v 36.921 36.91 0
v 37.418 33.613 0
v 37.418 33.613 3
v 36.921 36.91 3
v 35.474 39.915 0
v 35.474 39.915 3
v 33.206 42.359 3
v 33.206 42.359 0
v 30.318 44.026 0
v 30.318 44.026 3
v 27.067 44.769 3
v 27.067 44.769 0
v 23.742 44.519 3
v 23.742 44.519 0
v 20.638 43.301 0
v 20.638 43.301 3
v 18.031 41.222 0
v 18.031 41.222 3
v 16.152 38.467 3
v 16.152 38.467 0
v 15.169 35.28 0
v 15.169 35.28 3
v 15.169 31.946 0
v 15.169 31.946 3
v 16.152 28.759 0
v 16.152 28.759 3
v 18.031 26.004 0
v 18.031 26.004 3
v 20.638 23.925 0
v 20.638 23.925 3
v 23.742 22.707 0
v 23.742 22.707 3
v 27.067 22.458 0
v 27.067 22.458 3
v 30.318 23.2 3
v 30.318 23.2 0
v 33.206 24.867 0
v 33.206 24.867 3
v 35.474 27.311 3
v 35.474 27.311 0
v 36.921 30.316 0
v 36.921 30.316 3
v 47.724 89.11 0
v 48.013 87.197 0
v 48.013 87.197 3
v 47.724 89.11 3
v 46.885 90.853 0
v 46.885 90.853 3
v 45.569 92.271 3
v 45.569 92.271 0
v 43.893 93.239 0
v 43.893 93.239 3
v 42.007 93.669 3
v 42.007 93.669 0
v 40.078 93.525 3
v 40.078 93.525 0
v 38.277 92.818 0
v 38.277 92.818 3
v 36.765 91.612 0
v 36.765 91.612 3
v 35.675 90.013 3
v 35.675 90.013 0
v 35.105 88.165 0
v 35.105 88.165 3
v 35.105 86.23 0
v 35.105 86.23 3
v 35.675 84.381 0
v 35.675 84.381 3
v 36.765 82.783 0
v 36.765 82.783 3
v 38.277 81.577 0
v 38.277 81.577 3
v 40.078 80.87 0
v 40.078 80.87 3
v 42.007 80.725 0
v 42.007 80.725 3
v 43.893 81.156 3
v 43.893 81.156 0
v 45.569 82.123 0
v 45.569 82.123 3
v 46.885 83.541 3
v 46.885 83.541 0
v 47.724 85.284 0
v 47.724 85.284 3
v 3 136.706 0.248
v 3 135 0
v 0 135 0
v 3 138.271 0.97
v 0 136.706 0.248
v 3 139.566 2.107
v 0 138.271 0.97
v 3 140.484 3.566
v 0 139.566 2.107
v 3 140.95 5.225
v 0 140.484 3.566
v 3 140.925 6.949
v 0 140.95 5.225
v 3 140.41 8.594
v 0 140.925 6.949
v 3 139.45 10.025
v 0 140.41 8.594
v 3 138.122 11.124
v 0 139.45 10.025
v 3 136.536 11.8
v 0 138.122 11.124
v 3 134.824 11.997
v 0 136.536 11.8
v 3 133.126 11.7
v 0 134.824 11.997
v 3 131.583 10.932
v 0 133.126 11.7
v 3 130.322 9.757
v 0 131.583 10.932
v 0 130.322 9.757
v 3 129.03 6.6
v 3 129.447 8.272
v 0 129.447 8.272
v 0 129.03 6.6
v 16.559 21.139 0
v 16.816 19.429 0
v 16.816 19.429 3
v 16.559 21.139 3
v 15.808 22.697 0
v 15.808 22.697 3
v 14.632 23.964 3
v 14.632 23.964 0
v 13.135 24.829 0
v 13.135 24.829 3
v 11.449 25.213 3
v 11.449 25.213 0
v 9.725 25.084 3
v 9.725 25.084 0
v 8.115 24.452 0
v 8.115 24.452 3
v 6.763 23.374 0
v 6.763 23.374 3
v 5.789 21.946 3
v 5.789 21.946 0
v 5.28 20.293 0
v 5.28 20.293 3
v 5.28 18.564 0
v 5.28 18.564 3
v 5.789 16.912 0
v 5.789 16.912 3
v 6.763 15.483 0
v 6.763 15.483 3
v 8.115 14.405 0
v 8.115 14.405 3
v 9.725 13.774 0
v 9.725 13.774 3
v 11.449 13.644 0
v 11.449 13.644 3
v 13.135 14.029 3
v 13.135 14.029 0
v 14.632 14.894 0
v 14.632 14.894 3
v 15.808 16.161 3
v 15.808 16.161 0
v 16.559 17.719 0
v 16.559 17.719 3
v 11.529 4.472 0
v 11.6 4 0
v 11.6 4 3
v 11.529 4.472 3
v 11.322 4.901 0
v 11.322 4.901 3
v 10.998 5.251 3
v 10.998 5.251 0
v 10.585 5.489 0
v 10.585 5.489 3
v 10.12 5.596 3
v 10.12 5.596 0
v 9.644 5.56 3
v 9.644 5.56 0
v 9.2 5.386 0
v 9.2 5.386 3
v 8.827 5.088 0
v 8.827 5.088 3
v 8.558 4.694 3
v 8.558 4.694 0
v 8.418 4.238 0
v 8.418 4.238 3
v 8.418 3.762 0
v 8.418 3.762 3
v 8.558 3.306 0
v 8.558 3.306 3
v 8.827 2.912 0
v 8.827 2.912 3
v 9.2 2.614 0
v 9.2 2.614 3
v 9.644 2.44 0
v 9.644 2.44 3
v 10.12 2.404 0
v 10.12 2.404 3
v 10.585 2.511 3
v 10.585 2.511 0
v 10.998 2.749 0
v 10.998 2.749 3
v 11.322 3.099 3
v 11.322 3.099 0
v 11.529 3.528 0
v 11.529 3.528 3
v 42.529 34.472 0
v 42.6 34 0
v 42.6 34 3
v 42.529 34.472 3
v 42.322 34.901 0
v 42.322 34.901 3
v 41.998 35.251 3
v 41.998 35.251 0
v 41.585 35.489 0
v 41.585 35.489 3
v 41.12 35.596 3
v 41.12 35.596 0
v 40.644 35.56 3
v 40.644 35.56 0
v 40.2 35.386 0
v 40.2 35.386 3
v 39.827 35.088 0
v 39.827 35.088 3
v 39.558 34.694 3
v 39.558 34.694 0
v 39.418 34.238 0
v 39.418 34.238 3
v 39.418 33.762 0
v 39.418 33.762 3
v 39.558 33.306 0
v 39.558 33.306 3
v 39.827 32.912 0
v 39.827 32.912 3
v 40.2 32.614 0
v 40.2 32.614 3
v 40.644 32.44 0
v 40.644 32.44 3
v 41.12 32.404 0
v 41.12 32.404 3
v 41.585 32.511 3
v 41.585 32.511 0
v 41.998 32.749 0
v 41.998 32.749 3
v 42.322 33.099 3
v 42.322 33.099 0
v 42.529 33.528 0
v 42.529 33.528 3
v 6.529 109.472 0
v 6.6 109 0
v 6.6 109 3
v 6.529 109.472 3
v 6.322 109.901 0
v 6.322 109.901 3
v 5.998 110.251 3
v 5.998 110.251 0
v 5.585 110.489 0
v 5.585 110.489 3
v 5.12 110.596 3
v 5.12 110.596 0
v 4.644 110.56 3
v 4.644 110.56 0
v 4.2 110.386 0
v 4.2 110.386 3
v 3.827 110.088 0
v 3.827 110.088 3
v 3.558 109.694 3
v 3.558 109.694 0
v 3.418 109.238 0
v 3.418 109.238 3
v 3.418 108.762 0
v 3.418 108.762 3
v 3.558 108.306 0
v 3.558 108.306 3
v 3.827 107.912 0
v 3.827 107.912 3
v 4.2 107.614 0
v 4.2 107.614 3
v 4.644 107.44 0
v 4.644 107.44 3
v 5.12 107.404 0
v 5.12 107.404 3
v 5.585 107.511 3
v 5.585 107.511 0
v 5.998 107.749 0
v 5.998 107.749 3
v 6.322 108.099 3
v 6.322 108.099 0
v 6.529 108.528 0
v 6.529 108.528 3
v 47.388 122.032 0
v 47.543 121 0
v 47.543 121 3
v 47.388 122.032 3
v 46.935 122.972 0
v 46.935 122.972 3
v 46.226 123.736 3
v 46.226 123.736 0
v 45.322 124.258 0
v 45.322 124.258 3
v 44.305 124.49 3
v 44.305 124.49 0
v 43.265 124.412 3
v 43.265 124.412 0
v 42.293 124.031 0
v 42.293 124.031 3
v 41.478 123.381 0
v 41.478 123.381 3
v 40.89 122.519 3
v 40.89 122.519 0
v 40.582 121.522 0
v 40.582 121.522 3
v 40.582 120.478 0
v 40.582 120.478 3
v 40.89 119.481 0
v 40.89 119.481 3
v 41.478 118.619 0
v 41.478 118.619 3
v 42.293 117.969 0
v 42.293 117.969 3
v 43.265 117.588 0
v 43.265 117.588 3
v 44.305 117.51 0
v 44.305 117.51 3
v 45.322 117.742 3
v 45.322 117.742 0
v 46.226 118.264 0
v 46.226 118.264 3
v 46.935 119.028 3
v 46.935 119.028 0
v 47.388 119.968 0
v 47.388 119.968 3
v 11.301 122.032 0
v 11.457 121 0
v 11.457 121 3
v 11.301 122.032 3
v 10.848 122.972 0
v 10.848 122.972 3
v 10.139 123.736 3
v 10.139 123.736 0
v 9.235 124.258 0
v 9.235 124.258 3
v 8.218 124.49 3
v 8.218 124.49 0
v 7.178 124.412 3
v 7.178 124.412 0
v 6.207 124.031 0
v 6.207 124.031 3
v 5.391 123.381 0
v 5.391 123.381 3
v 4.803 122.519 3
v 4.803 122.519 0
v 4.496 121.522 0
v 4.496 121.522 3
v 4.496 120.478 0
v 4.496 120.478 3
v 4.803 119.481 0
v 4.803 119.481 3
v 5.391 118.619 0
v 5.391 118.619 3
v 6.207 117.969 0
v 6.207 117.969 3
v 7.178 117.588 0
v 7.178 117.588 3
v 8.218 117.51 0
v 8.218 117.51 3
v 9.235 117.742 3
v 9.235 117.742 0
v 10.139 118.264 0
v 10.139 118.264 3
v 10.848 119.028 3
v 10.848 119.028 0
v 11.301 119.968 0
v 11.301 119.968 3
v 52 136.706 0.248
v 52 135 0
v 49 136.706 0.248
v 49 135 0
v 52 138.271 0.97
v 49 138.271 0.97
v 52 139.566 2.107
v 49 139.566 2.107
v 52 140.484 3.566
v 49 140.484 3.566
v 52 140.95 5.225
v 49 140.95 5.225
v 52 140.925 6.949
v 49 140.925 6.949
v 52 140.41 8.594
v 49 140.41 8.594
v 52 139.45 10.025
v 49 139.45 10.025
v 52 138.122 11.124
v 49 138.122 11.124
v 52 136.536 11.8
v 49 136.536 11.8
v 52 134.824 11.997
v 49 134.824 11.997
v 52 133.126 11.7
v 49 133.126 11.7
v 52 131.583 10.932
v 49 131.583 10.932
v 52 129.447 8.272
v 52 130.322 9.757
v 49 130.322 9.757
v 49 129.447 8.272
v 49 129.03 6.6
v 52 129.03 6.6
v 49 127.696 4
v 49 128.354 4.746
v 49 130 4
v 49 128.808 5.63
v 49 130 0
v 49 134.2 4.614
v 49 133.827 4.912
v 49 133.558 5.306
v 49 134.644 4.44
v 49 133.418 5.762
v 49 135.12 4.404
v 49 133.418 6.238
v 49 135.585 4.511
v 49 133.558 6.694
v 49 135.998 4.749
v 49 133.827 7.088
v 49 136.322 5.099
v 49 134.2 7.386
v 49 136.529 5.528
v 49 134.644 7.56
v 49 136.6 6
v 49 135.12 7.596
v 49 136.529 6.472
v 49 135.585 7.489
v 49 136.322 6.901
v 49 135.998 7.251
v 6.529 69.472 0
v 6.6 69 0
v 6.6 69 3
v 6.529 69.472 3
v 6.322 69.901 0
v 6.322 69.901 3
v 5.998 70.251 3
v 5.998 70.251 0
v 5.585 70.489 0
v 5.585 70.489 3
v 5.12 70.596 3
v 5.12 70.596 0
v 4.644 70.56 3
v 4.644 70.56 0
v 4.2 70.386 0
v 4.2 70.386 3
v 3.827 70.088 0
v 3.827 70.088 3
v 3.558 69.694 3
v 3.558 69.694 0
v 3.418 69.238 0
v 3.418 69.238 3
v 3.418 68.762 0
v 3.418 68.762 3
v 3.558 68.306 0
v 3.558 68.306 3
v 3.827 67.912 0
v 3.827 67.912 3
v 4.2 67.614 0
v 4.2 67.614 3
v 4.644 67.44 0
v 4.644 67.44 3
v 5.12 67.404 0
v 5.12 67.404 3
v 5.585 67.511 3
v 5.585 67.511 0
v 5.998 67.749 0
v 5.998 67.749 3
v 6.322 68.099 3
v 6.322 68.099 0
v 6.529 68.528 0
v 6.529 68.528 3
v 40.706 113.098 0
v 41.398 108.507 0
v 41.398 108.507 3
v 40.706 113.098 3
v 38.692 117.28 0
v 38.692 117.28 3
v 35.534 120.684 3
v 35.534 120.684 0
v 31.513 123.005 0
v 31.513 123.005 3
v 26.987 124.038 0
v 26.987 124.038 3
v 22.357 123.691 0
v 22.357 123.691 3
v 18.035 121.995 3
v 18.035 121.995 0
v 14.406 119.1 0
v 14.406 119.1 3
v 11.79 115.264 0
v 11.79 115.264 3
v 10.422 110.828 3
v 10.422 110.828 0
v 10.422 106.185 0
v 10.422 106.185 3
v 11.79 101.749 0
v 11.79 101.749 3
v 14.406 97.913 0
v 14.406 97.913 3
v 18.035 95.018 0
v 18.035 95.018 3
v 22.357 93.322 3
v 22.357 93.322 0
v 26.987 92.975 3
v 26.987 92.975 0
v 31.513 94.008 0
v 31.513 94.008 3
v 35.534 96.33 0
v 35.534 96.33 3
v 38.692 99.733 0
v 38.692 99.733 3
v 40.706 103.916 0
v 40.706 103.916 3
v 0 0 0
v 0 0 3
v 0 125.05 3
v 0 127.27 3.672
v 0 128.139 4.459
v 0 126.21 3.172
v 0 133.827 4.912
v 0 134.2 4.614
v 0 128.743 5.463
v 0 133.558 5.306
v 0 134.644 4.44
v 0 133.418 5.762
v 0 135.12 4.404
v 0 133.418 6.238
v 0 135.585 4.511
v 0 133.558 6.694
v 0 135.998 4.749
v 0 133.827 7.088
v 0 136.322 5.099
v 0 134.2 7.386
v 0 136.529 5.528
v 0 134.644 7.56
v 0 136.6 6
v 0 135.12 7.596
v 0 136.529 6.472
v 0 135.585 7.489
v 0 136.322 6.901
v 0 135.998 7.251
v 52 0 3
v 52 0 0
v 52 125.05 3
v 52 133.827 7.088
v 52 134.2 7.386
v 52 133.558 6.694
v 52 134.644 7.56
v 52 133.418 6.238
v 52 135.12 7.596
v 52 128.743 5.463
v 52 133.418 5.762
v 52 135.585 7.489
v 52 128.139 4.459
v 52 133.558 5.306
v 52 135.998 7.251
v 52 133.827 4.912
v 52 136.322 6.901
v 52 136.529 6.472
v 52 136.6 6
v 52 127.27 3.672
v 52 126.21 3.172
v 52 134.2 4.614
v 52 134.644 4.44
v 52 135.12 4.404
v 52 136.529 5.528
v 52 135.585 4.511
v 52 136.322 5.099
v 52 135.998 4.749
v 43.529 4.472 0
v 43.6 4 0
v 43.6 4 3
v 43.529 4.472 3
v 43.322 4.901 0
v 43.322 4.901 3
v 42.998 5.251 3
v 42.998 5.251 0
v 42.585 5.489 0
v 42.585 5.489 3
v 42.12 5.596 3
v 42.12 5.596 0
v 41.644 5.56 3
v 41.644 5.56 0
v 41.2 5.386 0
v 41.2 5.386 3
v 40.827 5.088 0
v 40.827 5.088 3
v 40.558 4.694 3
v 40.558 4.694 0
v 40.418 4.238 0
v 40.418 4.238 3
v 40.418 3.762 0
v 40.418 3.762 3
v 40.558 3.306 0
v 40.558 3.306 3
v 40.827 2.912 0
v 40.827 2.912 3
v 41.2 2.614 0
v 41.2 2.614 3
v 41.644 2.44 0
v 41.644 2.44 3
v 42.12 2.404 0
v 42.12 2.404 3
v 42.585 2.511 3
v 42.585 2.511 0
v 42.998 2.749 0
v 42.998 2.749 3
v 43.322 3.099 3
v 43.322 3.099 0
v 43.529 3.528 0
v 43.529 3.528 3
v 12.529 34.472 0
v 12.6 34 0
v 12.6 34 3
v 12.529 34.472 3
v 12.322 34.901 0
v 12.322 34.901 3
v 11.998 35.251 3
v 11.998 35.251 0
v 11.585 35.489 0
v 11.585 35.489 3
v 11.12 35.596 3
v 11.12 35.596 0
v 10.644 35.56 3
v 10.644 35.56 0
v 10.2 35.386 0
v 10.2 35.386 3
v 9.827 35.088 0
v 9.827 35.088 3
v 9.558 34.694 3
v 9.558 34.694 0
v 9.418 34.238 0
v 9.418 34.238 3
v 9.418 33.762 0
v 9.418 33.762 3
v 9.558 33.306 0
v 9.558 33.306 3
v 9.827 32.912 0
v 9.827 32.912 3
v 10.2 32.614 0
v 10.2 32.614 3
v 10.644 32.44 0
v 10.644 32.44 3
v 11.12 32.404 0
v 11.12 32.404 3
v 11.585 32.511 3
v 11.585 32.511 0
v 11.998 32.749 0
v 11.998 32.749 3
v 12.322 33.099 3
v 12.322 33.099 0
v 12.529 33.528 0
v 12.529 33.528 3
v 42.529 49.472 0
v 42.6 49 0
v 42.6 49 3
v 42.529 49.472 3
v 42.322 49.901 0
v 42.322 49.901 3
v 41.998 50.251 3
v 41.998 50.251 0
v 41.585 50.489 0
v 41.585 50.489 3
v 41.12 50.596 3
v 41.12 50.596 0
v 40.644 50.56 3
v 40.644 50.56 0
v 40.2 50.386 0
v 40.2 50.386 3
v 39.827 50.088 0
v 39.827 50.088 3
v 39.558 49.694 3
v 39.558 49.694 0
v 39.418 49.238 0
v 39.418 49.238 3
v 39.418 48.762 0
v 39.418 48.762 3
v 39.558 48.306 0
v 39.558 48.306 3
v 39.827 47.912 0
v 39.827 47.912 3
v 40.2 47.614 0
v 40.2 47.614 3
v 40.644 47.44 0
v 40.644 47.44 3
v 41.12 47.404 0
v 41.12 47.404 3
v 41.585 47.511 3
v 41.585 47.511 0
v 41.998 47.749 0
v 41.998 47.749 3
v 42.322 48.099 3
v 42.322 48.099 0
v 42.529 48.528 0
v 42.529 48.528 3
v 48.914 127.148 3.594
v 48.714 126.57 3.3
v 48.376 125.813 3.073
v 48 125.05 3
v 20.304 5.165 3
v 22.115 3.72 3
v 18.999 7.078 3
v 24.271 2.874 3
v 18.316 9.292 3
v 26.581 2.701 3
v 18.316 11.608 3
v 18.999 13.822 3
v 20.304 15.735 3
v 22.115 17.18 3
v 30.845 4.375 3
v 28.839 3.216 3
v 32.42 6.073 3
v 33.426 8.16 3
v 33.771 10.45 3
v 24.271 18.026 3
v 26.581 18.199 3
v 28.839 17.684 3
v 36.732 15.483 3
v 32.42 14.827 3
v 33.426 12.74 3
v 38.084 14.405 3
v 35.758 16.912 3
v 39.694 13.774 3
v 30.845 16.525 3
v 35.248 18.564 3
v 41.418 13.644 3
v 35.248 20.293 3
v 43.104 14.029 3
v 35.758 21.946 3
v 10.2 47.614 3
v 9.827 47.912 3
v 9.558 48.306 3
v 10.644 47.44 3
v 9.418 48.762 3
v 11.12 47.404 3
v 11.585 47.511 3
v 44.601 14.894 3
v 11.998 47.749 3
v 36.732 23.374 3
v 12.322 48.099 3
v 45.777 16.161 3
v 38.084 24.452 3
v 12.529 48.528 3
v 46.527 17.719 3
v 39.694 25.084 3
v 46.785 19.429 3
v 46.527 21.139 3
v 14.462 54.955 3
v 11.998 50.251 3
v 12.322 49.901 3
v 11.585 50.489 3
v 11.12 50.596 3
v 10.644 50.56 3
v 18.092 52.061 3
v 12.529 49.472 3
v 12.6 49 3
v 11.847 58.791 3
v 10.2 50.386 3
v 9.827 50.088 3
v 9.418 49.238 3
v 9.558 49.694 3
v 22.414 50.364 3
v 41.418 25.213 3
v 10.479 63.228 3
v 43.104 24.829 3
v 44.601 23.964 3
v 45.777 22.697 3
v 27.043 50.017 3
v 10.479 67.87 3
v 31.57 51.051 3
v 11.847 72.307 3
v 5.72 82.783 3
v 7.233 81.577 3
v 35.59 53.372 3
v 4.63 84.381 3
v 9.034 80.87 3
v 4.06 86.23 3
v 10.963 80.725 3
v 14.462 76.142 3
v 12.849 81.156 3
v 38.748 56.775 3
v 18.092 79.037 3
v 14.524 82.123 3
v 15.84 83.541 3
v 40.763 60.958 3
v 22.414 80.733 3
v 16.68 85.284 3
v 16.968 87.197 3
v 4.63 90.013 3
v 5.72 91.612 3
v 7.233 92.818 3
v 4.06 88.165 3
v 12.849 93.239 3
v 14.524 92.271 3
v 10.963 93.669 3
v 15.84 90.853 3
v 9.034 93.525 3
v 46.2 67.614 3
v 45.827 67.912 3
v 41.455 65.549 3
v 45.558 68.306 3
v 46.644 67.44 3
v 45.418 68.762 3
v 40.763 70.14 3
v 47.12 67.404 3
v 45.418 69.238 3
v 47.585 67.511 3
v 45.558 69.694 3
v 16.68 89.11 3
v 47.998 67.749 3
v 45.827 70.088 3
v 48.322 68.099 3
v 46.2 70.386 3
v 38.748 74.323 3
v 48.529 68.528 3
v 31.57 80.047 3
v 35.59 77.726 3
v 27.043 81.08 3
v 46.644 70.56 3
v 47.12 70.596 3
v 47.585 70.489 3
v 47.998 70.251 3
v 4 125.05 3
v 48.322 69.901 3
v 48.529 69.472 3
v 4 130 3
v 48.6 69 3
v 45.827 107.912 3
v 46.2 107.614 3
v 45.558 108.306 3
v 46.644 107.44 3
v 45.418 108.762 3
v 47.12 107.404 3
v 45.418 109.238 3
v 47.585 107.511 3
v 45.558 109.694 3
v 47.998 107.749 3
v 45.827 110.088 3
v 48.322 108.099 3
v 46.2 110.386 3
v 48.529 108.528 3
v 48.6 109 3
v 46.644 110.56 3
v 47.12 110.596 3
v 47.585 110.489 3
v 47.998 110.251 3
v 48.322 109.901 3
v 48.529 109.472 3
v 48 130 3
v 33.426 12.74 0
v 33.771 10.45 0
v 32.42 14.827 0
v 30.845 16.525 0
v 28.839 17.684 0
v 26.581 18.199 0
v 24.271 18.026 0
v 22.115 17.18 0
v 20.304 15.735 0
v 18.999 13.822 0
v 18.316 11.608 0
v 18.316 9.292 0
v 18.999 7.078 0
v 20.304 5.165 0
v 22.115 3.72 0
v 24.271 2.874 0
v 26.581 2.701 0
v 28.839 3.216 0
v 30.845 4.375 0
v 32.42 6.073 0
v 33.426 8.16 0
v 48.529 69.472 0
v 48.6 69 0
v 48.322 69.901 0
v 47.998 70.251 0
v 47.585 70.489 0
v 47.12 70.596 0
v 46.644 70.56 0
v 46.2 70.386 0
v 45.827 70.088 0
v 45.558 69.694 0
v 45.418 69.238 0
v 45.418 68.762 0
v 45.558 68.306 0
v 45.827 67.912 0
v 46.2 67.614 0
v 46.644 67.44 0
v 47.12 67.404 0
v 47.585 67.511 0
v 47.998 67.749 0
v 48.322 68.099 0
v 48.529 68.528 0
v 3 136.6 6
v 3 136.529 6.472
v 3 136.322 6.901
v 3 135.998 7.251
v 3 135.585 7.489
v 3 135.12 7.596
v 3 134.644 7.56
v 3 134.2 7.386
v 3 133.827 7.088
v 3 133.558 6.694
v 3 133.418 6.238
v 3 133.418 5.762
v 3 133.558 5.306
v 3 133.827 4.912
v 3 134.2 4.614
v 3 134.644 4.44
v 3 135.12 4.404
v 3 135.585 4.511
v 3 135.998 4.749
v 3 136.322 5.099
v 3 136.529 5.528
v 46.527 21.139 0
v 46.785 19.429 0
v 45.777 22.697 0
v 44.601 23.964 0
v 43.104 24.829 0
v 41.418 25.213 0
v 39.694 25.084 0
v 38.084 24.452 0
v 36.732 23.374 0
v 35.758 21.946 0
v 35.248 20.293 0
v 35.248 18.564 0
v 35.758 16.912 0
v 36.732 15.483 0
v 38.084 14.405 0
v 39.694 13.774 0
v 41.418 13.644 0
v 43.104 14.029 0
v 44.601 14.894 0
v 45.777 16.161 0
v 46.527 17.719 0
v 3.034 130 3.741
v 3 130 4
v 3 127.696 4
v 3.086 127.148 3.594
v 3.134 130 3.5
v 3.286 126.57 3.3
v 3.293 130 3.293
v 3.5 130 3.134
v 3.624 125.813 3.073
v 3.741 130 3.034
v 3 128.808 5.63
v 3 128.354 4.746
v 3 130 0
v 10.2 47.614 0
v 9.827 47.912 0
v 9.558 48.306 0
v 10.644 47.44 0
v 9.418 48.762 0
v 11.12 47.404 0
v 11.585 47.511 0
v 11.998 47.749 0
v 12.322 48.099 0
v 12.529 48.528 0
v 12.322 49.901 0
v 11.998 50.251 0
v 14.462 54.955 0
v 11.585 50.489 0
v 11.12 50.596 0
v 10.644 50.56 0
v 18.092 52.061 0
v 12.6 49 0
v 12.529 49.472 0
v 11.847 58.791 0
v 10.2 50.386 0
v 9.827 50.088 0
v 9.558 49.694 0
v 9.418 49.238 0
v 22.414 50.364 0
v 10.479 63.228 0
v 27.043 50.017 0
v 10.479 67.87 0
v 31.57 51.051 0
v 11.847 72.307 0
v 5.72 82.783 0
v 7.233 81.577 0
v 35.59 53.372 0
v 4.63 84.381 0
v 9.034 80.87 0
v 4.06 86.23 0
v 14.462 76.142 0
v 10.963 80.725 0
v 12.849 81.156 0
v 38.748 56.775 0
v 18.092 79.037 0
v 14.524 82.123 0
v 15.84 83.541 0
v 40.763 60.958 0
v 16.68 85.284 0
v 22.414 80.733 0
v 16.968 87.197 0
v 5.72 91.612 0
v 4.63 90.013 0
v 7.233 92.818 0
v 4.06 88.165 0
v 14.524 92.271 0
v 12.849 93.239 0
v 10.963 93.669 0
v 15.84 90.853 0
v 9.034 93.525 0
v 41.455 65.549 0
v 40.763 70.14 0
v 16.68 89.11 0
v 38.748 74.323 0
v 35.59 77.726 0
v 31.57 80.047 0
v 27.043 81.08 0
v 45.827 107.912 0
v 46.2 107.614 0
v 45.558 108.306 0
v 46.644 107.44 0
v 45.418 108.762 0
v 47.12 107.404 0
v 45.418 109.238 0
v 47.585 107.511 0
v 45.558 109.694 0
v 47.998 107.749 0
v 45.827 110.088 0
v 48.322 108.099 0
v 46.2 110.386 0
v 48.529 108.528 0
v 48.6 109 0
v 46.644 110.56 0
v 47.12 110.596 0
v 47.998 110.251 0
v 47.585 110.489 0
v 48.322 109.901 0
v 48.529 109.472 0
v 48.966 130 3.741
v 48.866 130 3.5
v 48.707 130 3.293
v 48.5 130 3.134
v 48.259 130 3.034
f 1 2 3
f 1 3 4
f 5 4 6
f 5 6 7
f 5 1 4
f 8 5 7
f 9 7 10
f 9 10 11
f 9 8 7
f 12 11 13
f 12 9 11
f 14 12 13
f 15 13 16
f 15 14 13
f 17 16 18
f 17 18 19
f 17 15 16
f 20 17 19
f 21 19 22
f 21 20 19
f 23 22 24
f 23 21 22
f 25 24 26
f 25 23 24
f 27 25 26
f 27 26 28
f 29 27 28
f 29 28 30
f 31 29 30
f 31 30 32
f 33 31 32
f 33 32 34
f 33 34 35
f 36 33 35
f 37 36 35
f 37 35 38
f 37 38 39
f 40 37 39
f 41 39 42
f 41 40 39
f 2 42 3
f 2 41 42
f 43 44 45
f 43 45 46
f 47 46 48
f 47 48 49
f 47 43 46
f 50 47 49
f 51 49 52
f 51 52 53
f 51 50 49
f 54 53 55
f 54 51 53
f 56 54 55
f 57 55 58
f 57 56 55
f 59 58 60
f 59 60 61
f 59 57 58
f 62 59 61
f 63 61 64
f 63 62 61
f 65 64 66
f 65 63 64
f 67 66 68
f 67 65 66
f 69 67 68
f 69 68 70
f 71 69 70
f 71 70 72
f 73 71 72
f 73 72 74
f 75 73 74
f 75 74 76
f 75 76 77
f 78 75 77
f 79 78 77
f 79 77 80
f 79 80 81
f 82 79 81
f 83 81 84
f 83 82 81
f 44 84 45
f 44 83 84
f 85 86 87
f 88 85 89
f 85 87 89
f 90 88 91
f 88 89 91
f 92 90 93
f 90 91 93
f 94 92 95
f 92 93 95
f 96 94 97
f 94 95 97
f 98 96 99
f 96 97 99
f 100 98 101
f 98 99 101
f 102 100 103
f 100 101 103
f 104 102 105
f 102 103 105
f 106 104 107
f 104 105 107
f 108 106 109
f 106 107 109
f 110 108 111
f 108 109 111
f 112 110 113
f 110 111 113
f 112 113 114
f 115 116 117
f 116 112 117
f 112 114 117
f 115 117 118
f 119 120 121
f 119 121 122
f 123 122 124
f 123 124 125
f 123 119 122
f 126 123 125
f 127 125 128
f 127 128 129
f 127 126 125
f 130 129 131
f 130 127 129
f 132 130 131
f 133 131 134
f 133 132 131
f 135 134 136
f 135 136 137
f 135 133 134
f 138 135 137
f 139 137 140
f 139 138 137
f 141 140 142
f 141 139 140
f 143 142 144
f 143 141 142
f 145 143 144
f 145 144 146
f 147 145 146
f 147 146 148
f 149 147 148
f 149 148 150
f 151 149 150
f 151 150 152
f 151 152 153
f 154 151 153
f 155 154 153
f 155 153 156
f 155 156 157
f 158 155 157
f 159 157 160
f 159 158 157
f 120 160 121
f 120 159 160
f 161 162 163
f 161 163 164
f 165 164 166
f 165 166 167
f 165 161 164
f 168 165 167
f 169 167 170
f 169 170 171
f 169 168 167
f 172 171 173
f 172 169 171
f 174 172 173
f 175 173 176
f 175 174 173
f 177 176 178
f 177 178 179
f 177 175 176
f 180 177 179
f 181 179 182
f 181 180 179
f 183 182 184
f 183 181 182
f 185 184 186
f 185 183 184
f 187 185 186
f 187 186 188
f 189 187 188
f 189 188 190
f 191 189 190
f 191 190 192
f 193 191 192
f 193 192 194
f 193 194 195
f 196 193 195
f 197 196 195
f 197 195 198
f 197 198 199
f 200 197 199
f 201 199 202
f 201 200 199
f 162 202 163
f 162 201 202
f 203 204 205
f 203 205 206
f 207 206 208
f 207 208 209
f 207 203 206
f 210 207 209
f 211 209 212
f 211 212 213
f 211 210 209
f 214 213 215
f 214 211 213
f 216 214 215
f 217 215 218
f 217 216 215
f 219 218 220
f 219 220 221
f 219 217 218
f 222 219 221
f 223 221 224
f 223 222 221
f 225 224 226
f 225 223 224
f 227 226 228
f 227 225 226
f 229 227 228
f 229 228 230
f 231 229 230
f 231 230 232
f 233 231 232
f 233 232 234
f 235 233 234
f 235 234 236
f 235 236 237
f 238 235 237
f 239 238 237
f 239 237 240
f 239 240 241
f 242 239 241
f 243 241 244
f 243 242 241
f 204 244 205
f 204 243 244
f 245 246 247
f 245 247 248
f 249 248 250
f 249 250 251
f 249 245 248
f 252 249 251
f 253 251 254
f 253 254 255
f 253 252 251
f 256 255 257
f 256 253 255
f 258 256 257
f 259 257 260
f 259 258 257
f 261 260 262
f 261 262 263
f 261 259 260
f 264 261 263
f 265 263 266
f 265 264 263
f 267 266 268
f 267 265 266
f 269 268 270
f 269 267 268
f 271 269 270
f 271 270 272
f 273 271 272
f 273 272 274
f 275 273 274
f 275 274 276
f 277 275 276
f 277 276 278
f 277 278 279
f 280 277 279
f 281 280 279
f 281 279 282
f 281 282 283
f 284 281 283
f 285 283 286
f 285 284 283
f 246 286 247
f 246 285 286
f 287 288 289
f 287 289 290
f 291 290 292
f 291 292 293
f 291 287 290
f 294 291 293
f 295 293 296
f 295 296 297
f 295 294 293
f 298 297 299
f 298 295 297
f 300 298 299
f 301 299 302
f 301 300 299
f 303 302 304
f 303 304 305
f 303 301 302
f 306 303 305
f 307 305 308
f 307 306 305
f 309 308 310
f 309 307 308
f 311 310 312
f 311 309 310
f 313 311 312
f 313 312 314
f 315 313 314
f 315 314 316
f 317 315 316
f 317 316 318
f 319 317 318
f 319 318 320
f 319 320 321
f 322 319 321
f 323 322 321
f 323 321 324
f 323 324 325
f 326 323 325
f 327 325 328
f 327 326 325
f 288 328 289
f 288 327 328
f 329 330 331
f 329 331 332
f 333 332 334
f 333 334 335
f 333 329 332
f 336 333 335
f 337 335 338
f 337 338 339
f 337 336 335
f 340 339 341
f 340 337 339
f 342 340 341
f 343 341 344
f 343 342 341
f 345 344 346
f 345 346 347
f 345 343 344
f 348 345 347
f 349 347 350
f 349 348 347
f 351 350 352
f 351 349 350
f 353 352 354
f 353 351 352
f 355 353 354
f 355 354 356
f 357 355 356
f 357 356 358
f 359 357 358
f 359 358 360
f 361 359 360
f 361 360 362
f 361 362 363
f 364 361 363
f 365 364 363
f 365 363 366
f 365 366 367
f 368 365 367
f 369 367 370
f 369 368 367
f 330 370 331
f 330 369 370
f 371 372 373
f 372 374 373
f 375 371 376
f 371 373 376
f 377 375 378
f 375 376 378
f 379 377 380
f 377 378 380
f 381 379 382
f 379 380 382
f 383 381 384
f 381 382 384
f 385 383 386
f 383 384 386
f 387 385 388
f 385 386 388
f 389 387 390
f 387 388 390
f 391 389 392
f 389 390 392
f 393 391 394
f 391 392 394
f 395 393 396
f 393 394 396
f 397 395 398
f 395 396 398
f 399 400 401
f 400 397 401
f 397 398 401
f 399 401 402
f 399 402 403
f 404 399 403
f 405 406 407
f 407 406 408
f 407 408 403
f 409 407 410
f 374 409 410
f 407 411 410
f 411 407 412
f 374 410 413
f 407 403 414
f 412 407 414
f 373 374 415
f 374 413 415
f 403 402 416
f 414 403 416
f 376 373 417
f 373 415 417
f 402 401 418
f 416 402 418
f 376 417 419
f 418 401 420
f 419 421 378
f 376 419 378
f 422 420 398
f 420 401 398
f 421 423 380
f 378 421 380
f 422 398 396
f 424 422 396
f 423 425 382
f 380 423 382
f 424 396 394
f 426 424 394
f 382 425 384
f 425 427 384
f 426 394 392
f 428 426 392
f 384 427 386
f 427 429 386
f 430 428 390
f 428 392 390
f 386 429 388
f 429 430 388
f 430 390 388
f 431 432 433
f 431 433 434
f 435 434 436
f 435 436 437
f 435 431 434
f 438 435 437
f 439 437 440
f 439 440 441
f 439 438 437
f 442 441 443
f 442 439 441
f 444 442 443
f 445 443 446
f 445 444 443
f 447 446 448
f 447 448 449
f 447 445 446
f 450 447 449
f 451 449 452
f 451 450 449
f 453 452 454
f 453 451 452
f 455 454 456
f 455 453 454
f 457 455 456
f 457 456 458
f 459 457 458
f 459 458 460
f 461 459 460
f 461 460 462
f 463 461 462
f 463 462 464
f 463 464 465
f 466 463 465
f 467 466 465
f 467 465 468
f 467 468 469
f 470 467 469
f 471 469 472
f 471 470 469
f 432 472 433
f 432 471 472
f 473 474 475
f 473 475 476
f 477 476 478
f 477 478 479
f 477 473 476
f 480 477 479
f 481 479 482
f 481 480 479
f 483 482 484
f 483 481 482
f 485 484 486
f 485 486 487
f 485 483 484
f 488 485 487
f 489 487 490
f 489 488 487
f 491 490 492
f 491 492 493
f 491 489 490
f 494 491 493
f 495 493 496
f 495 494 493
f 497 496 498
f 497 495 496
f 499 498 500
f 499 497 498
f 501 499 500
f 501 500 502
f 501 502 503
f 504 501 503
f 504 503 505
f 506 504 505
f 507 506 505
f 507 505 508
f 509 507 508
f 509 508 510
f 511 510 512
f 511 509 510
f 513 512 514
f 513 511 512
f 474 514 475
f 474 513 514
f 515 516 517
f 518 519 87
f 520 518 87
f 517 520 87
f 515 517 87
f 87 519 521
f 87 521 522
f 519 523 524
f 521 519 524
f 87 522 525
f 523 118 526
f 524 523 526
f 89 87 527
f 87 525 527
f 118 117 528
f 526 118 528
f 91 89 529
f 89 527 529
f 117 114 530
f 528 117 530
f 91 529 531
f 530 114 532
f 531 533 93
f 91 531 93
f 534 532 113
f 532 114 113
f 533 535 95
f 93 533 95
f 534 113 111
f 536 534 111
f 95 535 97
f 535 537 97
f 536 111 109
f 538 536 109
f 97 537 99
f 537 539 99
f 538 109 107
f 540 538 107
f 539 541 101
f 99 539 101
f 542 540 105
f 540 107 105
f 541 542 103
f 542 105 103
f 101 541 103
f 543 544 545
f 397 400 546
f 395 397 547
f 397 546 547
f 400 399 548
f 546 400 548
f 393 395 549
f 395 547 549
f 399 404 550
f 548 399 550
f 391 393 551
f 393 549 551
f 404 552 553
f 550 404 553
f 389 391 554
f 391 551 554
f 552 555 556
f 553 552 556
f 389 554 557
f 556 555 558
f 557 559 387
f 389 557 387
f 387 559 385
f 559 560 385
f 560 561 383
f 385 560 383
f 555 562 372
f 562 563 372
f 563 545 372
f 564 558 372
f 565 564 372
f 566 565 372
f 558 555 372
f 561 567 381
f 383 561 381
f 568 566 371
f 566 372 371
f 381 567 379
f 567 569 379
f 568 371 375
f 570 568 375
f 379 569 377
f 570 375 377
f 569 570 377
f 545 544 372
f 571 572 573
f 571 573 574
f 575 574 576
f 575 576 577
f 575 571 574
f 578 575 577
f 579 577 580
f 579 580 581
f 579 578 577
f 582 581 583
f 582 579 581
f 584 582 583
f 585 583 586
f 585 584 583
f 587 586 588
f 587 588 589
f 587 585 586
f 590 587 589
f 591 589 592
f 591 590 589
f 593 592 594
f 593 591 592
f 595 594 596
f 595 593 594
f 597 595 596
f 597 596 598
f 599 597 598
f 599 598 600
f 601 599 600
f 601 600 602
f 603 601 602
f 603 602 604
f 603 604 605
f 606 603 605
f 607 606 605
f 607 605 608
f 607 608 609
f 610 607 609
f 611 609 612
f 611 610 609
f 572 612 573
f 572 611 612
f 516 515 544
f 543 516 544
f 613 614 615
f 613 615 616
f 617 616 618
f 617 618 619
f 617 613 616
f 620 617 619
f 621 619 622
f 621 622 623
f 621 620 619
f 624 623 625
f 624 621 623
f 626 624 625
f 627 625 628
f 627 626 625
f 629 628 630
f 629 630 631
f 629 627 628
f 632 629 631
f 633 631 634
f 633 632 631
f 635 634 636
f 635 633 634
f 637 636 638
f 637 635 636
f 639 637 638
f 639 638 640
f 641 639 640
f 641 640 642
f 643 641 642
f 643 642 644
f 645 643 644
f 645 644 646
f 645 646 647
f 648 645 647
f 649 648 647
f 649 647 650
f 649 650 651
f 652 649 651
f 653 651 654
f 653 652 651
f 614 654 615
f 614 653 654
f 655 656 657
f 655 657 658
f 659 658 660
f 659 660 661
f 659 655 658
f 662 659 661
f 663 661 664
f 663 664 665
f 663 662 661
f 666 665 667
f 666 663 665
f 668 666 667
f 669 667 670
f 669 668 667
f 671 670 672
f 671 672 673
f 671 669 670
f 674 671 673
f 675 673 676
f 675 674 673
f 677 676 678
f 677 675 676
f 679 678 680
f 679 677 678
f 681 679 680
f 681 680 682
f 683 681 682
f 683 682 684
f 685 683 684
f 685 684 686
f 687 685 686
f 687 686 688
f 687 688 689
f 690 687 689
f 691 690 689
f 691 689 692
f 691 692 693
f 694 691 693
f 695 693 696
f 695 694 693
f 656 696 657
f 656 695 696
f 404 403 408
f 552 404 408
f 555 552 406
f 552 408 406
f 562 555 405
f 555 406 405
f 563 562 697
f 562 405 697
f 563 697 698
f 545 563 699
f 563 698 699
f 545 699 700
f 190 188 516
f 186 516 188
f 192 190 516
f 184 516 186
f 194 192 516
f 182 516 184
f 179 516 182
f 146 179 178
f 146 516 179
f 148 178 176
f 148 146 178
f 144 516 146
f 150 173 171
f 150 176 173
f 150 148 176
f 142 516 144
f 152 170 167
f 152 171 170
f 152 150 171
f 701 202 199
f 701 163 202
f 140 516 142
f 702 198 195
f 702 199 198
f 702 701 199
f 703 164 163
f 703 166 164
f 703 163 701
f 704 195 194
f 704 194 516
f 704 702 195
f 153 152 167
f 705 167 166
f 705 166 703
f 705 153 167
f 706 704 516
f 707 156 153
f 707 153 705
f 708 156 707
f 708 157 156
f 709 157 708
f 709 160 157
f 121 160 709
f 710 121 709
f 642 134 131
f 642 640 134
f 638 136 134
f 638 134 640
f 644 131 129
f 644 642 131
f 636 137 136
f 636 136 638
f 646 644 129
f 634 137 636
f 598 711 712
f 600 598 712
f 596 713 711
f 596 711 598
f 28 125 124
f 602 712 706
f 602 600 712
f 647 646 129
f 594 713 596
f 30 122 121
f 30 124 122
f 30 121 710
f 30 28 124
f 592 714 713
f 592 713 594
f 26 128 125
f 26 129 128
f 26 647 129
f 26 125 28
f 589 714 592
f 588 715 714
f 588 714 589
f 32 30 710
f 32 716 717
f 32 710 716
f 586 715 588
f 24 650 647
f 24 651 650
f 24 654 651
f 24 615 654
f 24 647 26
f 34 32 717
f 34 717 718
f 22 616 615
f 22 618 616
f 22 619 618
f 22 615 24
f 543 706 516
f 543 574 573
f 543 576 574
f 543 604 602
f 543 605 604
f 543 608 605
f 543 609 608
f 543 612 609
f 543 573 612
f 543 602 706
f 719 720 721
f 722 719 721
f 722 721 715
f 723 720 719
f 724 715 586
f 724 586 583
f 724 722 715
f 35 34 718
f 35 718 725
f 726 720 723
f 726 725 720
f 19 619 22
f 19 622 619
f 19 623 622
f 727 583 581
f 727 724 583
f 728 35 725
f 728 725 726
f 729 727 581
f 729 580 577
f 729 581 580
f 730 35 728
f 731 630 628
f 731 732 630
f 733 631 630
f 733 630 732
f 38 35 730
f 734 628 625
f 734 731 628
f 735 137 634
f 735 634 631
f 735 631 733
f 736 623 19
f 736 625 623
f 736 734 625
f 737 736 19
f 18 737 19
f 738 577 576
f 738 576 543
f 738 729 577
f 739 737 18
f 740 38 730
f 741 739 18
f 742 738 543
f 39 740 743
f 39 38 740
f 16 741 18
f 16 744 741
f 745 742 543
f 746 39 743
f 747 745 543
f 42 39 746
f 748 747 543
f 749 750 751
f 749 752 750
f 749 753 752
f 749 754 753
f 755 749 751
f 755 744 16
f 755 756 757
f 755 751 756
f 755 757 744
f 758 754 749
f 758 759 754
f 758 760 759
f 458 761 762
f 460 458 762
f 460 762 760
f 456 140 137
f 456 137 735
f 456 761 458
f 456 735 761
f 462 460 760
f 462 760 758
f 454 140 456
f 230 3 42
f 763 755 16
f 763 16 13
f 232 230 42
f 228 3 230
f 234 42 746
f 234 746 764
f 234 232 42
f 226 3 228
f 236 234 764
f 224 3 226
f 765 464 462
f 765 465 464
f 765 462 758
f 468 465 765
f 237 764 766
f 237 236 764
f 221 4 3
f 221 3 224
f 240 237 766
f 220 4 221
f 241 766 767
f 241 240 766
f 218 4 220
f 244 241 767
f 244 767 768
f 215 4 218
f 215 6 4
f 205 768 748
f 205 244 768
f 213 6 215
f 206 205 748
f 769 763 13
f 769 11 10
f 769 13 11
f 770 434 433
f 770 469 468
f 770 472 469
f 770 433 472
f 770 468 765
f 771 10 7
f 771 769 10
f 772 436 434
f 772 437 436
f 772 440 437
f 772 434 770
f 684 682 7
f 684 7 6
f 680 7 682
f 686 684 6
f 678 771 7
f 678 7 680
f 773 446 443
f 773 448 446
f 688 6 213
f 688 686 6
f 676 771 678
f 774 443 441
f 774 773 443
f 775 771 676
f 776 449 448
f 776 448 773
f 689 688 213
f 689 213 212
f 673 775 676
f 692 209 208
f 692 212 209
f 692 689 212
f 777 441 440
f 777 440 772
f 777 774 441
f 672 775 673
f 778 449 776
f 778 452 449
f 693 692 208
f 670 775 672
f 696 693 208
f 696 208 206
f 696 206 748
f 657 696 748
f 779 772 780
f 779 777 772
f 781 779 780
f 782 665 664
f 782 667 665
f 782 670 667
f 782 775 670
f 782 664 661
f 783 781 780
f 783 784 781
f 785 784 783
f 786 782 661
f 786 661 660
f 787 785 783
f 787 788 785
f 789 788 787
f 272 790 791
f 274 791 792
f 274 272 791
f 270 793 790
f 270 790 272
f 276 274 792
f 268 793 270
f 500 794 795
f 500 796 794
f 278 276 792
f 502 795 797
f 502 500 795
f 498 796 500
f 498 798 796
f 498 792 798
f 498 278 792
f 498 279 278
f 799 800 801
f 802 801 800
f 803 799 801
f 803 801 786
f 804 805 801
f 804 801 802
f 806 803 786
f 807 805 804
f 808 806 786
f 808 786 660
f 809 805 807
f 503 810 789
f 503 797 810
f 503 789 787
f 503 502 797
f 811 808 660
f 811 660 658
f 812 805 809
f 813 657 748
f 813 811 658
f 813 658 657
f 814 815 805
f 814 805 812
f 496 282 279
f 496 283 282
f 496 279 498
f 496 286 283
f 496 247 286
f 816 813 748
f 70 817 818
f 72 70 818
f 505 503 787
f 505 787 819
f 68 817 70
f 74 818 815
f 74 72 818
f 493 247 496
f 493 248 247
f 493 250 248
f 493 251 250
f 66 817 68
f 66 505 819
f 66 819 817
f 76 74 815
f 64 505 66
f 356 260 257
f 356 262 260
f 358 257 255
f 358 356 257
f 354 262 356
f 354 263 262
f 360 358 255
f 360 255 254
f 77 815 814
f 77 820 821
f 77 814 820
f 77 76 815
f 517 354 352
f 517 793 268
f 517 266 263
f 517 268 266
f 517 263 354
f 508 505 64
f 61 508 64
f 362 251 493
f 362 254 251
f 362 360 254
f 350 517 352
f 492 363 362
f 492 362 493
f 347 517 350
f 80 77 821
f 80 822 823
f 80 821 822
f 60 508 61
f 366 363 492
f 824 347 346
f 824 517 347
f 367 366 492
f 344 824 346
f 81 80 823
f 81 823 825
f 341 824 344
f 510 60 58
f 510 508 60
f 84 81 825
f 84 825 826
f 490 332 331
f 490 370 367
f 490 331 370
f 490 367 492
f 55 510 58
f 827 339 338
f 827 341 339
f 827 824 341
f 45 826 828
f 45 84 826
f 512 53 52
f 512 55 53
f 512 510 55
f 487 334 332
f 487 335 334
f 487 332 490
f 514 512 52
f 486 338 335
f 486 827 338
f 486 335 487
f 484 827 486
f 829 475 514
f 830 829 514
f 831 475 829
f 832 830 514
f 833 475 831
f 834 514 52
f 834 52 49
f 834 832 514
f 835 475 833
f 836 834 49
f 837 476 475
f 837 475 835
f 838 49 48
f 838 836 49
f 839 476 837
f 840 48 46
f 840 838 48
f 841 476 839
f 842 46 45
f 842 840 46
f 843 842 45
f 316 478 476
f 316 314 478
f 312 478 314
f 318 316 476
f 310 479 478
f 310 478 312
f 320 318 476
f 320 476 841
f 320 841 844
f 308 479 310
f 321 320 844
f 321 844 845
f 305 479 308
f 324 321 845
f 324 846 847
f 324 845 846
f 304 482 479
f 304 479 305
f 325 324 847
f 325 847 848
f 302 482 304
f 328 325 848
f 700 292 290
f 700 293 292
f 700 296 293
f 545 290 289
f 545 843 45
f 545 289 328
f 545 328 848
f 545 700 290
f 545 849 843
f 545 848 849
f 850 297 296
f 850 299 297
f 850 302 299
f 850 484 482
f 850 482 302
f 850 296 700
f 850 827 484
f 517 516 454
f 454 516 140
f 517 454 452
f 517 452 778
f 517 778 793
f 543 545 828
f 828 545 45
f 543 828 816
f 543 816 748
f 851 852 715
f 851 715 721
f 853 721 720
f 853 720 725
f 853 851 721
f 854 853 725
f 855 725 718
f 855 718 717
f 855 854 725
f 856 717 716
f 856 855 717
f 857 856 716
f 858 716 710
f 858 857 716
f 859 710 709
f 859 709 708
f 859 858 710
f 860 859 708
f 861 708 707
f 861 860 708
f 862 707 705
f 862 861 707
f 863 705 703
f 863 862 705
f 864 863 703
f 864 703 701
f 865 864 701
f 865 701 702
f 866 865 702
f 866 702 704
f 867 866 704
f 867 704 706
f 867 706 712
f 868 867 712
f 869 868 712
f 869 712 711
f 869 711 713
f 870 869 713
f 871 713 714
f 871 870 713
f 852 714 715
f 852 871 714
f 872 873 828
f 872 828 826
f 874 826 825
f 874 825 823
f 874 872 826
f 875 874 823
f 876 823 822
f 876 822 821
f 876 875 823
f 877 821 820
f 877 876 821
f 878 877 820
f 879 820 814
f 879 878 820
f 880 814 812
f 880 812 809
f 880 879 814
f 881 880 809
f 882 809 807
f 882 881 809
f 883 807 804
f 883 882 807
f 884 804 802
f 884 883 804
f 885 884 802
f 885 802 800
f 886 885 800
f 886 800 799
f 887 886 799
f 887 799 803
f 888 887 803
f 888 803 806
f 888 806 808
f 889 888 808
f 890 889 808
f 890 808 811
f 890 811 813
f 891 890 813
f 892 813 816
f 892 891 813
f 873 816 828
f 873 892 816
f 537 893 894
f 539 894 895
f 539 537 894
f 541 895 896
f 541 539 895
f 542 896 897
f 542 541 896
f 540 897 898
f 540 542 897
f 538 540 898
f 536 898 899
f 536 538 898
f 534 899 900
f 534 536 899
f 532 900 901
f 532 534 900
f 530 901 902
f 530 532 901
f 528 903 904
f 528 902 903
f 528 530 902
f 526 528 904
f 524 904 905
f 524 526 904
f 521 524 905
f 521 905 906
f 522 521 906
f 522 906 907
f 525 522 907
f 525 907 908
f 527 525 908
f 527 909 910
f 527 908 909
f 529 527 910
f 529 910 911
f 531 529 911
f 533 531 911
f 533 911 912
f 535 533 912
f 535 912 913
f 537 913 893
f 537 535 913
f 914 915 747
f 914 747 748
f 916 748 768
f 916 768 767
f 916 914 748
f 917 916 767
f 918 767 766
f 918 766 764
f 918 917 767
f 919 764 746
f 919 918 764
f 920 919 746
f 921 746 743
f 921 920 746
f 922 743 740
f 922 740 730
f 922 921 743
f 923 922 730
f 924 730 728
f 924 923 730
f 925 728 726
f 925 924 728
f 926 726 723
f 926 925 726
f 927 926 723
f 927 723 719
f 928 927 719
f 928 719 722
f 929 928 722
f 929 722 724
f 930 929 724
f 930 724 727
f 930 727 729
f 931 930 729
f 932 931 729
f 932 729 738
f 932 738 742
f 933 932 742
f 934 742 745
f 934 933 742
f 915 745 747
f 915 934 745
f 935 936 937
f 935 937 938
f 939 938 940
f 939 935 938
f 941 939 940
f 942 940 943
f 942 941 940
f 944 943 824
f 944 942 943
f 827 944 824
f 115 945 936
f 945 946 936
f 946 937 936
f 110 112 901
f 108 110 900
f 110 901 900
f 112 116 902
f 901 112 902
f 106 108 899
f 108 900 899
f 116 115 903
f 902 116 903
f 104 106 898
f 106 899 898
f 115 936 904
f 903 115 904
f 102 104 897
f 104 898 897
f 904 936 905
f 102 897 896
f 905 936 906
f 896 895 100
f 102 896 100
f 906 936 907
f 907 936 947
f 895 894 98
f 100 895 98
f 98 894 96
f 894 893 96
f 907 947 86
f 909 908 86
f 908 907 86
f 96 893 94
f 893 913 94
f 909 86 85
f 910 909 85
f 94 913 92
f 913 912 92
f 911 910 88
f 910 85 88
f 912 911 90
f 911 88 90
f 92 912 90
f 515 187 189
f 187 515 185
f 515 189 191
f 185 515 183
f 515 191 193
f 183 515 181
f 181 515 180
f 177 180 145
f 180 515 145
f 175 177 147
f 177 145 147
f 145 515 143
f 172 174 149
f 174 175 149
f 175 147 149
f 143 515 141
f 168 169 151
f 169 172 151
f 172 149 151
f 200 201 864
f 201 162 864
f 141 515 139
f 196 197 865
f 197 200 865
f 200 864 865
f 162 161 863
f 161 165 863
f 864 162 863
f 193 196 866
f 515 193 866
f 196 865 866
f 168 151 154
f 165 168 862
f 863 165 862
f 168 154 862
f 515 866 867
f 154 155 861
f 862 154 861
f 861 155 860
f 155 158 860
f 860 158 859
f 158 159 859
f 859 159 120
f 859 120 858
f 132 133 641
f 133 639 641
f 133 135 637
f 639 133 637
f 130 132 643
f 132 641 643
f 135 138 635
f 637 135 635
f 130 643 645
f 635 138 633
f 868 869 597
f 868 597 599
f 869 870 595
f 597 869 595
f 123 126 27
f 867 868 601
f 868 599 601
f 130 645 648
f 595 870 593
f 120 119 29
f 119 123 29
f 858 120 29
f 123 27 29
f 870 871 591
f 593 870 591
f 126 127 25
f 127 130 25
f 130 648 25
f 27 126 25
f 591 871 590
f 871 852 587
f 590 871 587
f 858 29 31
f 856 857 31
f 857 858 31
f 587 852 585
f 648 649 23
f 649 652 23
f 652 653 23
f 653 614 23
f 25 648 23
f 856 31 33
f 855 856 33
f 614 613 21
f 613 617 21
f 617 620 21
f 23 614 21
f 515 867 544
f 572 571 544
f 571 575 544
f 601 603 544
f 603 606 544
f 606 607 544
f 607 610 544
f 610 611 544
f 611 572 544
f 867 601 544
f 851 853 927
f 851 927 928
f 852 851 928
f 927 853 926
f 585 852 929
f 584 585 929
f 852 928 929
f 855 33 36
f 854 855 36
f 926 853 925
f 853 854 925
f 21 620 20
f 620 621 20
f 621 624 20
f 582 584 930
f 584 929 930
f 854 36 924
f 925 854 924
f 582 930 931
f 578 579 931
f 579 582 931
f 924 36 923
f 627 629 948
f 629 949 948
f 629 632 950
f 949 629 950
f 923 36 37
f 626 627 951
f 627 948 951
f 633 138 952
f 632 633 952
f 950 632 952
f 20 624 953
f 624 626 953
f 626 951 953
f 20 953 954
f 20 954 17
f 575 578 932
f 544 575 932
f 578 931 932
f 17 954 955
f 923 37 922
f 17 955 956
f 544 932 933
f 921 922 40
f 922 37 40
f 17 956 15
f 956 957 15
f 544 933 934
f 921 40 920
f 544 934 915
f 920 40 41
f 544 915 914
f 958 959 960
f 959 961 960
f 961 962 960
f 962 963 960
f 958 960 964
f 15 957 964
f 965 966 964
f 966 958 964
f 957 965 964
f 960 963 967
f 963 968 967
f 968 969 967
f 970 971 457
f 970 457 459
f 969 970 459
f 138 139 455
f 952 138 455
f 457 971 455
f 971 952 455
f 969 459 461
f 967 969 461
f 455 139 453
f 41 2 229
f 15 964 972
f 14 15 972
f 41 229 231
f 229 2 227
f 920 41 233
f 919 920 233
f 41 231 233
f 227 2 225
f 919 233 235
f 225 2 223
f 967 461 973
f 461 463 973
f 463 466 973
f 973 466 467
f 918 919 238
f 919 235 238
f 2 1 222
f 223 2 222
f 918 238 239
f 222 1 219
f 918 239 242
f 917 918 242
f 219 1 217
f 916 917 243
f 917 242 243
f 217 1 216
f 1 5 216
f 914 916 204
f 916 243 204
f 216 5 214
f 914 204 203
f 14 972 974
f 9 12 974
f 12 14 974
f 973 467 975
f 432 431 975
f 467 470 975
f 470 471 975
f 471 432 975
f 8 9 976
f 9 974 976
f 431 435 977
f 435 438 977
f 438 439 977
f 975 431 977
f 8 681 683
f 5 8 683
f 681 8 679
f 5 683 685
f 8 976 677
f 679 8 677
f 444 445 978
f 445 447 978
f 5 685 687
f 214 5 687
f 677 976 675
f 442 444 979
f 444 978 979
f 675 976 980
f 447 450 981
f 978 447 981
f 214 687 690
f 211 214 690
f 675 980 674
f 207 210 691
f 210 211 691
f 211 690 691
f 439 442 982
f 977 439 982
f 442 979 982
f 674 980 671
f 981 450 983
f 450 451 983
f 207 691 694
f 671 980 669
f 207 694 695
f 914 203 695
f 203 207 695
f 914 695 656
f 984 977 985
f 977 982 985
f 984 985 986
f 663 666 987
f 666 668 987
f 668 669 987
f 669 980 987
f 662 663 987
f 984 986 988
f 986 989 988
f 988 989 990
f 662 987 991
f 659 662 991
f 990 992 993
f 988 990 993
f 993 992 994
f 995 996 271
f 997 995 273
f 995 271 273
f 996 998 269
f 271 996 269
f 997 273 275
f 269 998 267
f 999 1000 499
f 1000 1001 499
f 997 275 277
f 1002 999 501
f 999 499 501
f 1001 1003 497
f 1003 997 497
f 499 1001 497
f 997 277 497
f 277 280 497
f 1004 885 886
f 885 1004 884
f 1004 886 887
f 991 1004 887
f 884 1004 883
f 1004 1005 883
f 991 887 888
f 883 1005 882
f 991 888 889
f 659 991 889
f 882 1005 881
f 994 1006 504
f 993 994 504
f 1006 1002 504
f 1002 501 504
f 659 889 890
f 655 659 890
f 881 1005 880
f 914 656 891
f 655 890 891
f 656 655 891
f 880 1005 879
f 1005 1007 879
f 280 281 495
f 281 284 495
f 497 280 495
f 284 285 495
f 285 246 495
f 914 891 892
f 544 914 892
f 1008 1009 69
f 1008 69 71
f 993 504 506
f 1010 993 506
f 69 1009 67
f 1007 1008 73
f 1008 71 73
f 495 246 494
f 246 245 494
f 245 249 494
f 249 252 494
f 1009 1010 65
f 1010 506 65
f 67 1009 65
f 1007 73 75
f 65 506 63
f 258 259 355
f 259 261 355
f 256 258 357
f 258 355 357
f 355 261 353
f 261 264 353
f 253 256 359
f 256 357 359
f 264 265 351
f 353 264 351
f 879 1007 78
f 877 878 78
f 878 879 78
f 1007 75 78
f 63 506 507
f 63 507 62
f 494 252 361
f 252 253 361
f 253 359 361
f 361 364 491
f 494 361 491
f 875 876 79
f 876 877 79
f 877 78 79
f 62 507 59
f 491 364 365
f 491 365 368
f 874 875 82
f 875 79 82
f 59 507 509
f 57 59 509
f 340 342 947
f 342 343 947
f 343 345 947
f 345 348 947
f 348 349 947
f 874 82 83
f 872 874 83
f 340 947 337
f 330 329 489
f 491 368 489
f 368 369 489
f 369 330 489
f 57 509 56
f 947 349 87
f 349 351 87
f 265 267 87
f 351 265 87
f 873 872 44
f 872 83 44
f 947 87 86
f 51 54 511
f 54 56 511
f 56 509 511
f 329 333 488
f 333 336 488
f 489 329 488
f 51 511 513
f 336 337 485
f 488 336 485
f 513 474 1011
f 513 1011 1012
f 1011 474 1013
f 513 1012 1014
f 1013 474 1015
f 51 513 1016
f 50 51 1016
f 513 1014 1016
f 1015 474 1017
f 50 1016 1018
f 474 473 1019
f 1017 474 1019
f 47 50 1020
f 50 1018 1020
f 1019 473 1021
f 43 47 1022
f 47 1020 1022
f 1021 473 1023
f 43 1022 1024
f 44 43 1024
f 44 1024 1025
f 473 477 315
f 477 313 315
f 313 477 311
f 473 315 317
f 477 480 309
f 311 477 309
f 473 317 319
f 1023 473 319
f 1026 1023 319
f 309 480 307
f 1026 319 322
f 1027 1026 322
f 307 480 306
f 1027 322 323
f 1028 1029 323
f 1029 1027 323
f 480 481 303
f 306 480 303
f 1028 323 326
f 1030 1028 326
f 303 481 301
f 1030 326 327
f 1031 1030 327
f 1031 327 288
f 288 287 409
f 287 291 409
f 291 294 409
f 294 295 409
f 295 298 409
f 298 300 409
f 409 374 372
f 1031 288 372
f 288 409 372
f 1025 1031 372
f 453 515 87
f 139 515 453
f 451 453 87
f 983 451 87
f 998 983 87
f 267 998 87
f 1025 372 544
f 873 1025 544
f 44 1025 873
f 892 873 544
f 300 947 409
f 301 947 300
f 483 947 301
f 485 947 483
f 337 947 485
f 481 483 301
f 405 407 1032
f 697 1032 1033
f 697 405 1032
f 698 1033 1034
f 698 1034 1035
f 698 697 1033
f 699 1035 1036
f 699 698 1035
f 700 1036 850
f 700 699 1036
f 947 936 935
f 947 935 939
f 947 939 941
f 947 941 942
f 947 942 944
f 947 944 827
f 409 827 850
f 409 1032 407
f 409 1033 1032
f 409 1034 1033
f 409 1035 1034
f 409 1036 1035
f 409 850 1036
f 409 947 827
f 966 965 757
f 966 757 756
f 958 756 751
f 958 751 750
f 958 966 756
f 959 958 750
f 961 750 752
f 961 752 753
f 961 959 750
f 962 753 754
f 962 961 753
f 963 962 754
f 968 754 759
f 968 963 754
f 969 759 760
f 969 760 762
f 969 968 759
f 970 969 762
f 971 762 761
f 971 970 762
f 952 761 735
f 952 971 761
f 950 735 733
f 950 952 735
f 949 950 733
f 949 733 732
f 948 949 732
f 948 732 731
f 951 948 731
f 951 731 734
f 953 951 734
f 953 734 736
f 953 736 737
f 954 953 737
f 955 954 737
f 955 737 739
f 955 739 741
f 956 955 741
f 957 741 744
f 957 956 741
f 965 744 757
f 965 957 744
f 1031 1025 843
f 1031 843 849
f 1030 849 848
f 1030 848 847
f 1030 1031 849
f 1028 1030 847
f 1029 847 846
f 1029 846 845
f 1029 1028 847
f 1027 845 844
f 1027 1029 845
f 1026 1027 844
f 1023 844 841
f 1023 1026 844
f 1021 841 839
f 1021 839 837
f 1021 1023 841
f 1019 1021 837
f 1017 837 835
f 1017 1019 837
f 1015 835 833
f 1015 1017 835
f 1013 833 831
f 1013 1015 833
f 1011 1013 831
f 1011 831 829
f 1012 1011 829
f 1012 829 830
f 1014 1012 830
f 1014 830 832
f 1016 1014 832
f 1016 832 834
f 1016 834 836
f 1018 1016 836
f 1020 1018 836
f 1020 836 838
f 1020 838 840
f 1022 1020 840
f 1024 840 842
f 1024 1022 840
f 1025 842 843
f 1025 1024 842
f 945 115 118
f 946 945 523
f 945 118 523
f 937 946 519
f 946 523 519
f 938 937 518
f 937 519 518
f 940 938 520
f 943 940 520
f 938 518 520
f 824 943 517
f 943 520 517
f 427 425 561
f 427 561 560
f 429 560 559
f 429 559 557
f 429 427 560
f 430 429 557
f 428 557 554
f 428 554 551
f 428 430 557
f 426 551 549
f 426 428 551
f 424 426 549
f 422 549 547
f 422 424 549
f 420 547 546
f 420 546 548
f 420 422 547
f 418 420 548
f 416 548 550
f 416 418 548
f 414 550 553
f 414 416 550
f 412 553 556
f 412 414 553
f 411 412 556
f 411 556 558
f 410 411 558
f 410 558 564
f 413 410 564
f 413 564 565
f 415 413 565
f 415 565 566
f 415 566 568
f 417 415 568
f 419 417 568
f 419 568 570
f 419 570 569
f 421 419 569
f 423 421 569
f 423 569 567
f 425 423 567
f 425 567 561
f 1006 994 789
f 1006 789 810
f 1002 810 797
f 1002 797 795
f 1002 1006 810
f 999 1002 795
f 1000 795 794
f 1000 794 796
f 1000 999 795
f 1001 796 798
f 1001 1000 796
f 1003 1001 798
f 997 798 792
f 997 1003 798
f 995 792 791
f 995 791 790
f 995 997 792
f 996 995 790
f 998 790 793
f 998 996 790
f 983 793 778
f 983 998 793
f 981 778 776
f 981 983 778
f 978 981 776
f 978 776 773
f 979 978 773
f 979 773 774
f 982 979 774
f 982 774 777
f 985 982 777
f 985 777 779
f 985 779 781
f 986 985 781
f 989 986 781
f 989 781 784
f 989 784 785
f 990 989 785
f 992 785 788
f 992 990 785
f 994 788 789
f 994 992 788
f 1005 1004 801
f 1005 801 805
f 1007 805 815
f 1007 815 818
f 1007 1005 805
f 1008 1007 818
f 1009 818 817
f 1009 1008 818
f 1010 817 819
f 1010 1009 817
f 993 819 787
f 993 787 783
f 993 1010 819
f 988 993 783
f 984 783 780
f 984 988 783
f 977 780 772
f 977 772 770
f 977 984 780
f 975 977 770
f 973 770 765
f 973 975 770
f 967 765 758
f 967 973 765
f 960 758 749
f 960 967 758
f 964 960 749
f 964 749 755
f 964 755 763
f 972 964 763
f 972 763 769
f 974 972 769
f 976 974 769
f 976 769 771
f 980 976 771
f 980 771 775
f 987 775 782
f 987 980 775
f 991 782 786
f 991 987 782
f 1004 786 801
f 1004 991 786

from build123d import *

# Parameters (mm, degrees)
SKETCH003_W   = 46
SKETCH003_H   = 10
PAD003_DEPTH  = 5
SKETCH001_R   = 6
SKETCH001_R_2 = 1.6
PAD001_DEPTH  = 3
SKETCH_W      = 52
SKETCH_H      = 135
SKETCH_R      = 1.6
SKETCH_R_2    = 15.574954
SKETCH_R_3    = 11.186667
SKETCH_R_4    = 6.490241
SKETCH_R_5    = 3.5
SKETCH_R_6    = 7.770751
SKETCH_R_7    = 5.800756
PAD_DEPTH     = 3
SKETCH002_R   = 6
SKETCH002_R_2 = 1.6
PAD002_DEPTH  = 3
FILLET_R      = 4
FILLET001_R   = 4
FILLET002_R   = 1
FILLET003_R   = 1


with BuildPart() as pad003:
    # Sketch003 → Pad003 (new body)
    with BuildSketch(Plane.XY):
        with Locations((26, 135)):
            Rectangle(SKETCH003_W, SKETCH003_H)
    extrude(amount=PAD003_DEPTH)


with BuildPart() as pad001:
    # Sketch001 → Pad001 (new body)
    with BuildSketch(Plane(origin=(0, 135, 0), x_dir=(0, 1, 0), z_dir=(1, 0, 0))):
        with Locations((0, 6)):
            Circle(SKETCH001_R)
        with Locations((0, 6)):
            Circle(SKETCH001_R_2, mode=Mode.SUBTRACT)
    extrude(amount=PAD001_DEPTH)


with BuildPart() as fusion:
    # Sketch → Pad (new body)
    with BuildSketch(Plane.XY):
        with Locations((26, 67.5)):
            Rectangle(SKETCH_W, SKETCH_H)
        with Locations((10, 4)):
            Circle(SKETCH_R, mode=Mode.SUBTRACT)
        with Locations((42, 4)):
            Circle(SKETCH_R, mode=Mode.SUBTRACT)
        with Locations((11, 34)):
            Circle(SKETCH_R, mode=Mode.SUBTRACT)
        with Locations((41, 34)):
            Circle(SKETCH_R, mode=Mode.SUBTRACT)
        with Locations((11, 49)):
            Circle(SKETCH_R, mode=Mode.SUBTRACT)
        with Locations((41, 49)):
            Circle(SKETCH_R, mode=Mode.SUBTRACT)
        with Locations((5, 69)):
            Circle(SKETCH_R, mode=Mode.SUBTRACT)
        with Locations((47, 69)):
            Circle(SKETCH_R, mode=Mode.SUBTRACT)
        with Locations((5, 109)):
            Circle(SKETCH_R, mode=Mode.SUBTRACT)
        with Locations((47, 109)):
            Circle(SKETCH_R, mode=Mode.SUBTRACT)
        with Locations((25.822891, 108.506721)):
            Circle(SKETCH_R_2, mode=Mode.SUBTRACT)
        with Locations((25.87958, 65.548828)):
            Circle(SKETCH_R_2, mode=Mode.SUBTRACT)
        with Locations((26.231028, 33.613125)):
            Circle(SKETCH_R_3, mode=Mode.SUBTRACT)
        with Locations((10.477721, 87.19722)):
            Circle(SKETCH_R_4, mode=Mode.SUBTRACT)
        with Locations((41.522279, 87.19722)):
            Circle(SKETCH_R_4, mode=Mode.SUBTRACT)
        with Locations((7.956594, 121)):
            Circle(SKETCH_R_5, mode=Mode.SUBTRACT)
        with Locations((44.043406, 121)):
            Circle(SKETCH_R_5, mode=Mode.SUBTRACT)
        with Locations((26, 10.44999)):
            Circle(SKETCH_R_6, mode=Mode.SUBTRACT)
        with Locations((11.015624, 19.428881)):
            Circle(SKETCH_R_7, mode=Mode.SUBTRACT)
        with Locations((40.984376, 19.428881)):
            Circle(SKETCH_R_7, mode=Mode.SUBTRACT)
    extrude(amount=PAD_DEPTH)

    # Fusion: union Pad001
    add(pad001.part)


with BuildPart() as fillet003:
    # Sketch002 → Pad002 (new body)
    with BuildSketch(Plane(origin=(49, 135, 0), x_dir=(0, 1, 0), z_dir=(1, 0, 0))):
        with Locations((0, 6)):
            Circle(SKETCH002_R)
        with Locations((0, 6)):
            Circle(SKETCH002_R_2, mode=Mode.SUBTRACT)
    extrude(amount=PAD002_DEPTH)

    # Fusion001: union Fusion
    add(fusion.part)

    # Fillet
    fillet_edges = [fillet003.edges().sort_by_distance(p)[0] for p in [
        (1.5, 129.803848, 3),
    ]]
    fillet(fillet_edges, radius=FILLET_R)

    # Fillet001
    fillet001_edges = [fillet003.edges().sort_by_distance(p)[0] for p in [
        (50.5, 129.803848, 3),
    ]]
    fillet(fillet001_edges, radius=FILLET001_R)

    # Cut: cut Pad003
    add(pad003.part, mode=Mode.SUBTRACT)

    # Fillet002
    fillet002_edges = [fillet003.edges().sort_by_distance(p)[0] for p in [
        (3, 127.426987, 3),
    ]]
    fillet(fillet002_edges, radius=FILLET002_R)

    # Fillet003
    fillet003_edges = [fillet003.edges().sort_by_distance(p)[0] for p in [
        (49, 127.426987, 3),
    ]]
    fillet(fillet003_edges, radius=FILLET003_R)


solid = fillet003.part
